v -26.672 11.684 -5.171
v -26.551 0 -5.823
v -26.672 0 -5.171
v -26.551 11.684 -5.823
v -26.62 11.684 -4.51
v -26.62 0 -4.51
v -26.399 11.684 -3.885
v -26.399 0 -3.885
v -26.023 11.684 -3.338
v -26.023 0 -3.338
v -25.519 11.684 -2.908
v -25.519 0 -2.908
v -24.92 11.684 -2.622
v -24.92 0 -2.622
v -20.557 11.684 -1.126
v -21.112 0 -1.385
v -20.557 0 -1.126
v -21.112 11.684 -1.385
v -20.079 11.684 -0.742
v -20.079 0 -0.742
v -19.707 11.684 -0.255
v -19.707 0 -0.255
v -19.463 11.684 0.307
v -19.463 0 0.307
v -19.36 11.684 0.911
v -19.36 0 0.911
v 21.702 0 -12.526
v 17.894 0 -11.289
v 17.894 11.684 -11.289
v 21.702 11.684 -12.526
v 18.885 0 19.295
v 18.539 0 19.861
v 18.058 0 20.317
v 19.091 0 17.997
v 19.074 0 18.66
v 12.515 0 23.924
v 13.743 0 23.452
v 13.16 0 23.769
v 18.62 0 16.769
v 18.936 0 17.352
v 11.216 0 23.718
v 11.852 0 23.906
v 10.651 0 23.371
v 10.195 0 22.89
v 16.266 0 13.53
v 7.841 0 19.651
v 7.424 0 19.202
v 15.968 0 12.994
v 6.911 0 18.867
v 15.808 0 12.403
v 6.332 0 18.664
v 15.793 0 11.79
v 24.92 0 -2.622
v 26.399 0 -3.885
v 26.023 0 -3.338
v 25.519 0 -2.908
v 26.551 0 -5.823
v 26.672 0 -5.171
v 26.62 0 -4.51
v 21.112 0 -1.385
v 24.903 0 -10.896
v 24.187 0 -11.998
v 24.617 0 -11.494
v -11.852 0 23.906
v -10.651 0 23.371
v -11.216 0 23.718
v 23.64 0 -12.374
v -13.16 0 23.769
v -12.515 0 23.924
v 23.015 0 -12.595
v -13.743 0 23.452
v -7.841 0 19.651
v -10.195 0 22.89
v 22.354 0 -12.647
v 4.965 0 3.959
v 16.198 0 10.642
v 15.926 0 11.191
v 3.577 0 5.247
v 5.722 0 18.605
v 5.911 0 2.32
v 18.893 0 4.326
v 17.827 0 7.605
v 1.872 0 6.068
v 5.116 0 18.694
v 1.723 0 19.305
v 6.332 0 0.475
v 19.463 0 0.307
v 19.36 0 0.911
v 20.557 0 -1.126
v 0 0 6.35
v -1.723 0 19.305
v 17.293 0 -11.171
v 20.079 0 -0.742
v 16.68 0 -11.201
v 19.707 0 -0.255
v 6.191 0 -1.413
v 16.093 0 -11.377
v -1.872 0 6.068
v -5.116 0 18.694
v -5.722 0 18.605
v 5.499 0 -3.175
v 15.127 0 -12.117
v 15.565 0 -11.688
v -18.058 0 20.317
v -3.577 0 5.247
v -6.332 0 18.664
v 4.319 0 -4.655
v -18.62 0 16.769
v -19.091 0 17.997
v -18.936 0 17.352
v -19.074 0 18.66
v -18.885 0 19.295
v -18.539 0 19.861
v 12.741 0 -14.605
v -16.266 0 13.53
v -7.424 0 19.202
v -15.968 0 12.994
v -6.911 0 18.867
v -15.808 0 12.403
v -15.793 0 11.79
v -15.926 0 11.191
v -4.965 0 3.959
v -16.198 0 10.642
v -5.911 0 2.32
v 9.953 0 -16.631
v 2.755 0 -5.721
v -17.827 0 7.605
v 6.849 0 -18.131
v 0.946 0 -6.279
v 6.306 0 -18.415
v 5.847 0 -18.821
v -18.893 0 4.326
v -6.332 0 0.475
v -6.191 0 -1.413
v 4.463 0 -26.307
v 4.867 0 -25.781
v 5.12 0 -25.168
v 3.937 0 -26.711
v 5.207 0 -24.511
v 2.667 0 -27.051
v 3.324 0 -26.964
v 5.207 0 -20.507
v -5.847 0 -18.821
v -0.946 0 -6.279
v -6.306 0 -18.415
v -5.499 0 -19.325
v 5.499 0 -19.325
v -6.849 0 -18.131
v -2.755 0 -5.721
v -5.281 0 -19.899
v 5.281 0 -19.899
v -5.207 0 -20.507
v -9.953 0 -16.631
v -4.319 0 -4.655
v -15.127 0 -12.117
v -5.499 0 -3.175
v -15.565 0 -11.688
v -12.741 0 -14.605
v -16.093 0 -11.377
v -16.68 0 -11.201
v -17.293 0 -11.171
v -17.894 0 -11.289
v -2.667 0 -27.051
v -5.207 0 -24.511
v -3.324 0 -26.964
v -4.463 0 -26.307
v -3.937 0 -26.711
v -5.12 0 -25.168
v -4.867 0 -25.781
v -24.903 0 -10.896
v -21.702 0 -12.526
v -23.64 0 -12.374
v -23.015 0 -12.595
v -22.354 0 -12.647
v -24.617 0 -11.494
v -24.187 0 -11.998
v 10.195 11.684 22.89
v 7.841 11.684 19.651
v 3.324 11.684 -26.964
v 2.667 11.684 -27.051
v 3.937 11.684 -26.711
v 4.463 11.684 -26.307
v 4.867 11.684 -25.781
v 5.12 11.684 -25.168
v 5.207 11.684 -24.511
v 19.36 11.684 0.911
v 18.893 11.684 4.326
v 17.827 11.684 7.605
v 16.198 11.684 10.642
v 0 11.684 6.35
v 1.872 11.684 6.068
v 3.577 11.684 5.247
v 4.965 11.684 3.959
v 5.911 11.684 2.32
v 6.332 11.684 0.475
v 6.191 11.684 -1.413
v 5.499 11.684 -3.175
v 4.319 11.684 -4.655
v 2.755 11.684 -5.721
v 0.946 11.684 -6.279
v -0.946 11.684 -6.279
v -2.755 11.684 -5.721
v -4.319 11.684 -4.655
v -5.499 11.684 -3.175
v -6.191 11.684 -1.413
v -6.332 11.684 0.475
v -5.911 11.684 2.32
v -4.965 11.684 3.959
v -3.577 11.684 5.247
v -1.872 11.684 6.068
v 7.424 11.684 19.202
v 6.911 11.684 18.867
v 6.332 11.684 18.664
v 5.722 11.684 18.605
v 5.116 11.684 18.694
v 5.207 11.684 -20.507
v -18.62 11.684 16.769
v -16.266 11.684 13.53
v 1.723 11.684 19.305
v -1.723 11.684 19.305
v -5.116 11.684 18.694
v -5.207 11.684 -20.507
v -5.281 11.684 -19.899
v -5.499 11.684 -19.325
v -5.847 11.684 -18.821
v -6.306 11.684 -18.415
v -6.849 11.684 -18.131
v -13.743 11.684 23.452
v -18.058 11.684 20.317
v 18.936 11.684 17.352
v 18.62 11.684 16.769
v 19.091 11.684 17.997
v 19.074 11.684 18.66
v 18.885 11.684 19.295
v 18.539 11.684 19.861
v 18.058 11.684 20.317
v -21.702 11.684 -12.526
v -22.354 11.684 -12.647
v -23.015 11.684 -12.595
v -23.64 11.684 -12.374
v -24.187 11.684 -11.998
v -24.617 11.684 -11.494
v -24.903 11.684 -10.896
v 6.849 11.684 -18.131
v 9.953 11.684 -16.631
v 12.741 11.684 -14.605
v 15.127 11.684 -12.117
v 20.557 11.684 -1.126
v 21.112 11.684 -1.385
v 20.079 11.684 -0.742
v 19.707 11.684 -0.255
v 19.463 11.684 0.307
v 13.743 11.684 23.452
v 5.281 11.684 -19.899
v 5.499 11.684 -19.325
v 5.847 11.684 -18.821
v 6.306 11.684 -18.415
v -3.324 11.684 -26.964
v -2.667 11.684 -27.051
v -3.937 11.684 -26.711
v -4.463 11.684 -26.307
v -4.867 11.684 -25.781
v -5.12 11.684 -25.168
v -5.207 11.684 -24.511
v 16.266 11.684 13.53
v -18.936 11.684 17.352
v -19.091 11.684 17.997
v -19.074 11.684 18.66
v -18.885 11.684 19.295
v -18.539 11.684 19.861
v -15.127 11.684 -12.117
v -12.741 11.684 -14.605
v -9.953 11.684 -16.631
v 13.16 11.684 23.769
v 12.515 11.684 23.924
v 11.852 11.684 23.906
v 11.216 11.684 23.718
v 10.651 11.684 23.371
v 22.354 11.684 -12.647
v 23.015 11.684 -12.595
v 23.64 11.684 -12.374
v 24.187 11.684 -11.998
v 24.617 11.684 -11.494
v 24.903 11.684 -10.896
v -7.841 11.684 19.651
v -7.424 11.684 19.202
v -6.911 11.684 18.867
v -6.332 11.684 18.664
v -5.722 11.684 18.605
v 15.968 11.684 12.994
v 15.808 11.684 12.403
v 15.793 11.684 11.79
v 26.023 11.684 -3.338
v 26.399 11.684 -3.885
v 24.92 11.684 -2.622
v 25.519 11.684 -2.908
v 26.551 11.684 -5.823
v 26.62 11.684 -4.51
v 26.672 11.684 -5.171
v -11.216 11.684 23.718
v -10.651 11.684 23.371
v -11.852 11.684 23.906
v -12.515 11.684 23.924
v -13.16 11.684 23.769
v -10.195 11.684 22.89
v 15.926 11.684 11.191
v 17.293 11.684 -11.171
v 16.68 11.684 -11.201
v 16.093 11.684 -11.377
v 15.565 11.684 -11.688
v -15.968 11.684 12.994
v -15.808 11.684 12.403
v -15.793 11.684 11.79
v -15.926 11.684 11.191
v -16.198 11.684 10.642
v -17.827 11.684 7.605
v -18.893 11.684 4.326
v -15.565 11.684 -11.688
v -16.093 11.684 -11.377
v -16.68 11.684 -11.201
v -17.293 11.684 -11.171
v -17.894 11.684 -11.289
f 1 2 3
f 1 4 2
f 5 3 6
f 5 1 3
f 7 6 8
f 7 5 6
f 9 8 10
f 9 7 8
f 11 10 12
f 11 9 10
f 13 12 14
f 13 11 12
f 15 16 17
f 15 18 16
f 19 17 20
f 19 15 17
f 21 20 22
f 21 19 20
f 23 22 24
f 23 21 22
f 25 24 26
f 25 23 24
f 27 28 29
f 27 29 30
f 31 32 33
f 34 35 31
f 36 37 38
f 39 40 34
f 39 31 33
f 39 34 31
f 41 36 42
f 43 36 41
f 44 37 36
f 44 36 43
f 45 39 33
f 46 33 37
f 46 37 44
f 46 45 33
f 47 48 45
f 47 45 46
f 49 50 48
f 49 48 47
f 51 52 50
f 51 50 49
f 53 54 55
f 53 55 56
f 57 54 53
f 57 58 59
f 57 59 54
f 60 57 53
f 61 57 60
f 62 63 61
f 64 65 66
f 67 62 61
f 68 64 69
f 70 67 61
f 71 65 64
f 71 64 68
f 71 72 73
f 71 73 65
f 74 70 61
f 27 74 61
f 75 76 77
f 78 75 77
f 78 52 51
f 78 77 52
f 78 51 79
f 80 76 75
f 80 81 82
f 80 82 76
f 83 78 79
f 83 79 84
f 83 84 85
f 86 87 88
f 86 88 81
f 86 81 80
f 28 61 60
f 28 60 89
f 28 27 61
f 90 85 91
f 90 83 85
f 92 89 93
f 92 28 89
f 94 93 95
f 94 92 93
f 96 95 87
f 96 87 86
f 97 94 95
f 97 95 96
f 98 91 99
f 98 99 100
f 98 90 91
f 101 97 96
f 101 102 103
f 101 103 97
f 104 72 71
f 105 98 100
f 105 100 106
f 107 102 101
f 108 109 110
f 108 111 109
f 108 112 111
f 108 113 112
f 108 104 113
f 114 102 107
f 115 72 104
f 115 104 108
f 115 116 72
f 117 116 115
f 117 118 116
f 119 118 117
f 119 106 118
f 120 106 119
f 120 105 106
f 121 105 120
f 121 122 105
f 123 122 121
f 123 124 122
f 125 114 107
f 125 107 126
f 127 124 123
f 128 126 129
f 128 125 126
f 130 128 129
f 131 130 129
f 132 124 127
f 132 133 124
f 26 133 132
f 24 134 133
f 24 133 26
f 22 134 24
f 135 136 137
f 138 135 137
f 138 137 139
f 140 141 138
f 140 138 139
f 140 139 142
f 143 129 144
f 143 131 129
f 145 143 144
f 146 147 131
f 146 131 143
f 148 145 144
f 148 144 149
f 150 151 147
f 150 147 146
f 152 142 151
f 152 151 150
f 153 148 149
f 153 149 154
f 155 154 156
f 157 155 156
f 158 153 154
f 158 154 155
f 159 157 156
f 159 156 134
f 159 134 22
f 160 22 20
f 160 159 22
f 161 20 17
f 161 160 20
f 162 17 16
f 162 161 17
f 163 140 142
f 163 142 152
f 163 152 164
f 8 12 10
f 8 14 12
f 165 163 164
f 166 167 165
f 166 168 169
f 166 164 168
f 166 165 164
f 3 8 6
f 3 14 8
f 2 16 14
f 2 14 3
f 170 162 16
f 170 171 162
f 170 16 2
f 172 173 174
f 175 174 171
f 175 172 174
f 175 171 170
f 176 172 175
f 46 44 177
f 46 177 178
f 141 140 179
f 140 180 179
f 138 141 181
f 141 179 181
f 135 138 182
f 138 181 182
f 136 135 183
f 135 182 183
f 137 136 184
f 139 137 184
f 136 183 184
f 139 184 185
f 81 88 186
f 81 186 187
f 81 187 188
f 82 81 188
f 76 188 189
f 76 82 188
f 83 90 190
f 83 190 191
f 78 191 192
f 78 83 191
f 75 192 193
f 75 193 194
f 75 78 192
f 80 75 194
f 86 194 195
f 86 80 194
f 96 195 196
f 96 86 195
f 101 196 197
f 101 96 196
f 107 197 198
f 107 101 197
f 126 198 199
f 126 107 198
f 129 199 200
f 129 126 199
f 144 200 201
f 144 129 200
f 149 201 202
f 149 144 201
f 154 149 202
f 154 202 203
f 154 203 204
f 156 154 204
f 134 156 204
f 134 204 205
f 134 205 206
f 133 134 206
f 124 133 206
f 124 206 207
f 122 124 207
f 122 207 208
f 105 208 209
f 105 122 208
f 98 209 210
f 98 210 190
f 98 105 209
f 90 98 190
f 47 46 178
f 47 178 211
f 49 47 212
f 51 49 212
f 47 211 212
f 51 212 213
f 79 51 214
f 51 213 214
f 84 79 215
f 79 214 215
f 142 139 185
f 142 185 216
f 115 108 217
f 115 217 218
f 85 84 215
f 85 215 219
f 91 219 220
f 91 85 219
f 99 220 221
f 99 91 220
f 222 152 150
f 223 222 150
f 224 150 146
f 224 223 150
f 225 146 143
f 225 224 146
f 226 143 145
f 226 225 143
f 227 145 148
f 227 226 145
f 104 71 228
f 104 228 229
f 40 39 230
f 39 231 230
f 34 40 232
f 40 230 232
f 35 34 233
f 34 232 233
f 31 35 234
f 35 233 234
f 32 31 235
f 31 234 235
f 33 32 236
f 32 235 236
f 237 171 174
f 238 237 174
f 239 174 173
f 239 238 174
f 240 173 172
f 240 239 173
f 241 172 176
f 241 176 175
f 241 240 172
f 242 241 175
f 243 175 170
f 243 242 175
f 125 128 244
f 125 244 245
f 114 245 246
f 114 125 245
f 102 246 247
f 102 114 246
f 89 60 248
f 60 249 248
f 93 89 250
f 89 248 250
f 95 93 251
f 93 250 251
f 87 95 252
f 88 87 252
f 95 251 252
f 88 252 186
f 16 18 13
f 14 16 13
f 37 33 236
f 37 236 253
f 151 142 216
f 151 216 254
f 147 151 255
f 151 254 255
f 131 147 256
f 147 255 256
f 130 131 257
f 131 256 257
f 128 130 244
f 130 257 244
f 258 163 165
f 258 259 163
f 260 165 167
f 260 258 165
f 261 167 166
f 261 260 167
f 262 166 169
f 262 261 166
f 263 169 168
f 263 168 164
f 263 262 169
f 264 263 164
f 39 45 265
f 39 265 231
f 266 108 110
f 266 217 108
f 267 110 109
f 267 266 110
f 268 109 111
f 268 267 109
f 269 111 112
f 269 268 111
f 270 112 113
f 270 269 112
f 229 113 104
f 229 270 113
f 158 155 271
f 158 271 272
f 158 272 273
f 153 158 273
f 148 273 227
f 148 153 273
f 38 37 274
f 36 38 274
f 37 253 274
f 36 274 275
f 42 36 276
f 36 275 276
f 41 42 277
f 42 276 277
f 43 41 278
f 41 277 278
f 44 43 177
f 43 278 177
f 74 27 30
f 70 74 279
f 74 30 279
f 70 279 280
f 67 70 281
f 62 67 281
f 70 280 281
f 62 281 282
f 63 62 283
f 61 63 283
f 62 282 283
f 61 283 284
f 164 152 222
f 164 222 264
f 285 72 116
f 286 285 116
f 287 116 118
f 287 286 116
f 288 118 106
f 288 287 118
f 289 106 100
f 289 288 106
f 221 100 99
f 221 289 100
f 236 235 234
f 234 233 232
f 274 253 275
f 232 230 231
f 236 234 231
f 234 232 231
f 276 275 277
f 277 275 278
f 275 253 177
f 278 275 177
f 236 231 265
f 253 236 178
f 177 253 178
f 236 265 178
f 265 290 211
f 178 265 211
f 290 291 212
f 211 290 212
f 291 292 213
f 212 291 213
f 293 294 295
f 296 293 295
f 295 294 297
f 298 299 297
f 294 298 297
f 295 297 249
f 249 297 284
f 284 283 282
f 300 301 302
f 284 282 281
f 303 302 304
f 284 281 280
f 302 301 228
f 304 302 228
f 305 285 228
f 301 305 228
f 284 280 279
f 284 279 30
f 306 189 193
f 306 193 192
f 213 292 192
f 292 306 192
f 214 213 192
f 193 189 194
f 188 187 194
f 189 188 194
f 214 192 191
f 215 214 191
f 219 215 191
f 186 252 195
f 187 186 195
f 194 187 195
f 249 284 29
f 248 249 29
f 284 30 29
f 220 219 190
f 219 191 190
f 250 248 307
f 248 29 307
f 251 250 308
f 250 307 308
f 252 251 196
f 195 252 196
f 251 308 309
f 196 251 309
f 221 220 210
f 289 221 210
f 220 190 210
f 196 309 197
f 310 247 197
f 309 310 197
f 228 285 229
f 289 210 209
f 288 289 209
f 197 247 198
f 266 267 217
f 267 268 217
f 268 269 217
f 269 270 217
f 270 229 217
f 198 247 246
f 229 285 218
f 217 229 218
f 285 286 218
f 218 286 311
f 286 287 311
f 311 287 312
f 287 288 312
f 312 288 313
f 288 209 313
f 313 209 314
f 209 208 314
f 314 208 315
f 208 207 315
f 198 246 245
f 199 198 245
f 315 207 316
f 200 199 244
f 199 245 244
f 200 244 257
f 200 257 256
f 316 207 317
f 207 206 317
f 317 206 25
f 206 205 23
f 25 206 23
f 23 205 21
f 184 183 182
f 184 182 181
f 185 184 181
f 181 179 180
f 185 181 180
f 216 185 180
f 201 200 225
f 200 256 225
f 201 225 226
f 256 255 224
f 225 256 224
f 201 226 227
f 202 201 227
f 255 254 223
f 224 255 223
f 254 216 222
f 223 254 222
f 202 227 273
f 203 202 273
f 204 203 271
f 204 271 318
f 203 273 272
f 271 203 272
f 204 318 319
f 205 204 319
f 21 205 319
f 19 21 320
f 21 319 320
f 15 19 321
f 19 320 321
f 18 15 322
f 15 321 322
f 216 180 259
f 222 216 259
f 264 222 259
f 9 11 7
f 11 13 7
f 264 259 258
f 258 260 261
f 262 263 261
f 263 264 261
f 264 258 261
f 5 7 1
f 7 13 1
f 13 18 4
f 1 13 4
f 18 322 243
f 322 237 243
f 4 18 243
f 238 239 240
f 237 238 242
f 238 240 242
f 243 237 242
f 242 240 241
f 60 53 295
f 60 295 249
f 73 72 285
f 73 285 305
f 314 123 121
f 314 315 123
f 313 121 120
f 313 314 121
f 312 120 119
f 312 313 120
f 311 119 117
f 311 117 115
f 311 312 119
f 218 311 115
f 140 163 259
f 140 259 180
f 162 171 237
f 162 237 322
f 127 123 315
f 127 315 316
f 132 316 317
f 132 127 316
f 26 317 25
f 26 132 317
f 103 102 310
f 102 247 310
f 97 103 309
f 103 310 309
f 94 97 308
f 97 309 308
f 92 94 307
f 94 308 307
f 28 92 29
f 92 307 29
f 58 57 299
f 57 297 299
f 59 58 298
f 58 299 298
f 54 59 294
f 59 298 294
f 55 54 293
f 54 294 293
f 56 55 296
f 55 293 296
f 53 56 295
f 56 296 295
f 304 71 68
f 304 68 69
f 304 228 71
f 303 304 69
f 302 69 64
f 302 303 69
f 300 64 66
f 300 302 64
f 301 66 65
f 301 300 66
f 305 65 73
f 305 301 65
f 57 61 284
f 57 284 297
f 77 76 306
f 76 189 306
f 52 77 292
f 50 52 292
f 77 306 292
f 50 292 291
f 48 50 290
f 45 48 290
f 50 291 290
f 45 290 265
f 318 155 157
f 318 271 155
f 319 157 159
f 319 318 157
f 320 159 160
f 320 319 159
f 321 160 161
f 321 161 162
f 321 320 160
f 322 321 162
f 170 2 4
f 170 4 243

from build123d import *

# Parameters (mm, degrees)
SKETCH2_R           = 6.35
BOSS_EXTRUDE3_DEPTH = 11.684
FILLET1_R           = 2.54


with BuildPart() as part:
    # Sketch2 → Boss-Extrude3 (new body)
    with BuildSketch(Plane(origin=(0, 0, 0), x_dir=(1, 0, 0), z_dir=(0, 1, 0))):
        with BuildLine():
            Line((-5.207, 27.051), (5.207, 27.051))
            Line((5.207, 27.051), (5.207, 18.669))
            ThreePointArc((5.207, 18.669), (11.392188189, 15.680001858), (16.146222613, 10.721189548))
            Line((16.146222613, 10.721189548), (24.117978333, 13.311369995))
            Line((24.117978333, 13.311369995), (27.336081312, 3.407067434))
            Line((27.336081312, 3.407067434), (19.364325592, 0.816886988))
            ThreePointArc((19.364325592, 0.816886988), (18.432947696, -5.989227766), (15.185914365, -12.042940459))
            Line((15.185914365, -12.042940459), (20.112730349, -18.824120906))
            Line((20.112730349, -18.824120906), (11.68762737, -24.945316524))
            Line((11.68762737, -24.945316524), (6.760811385, -18.164136077))
            ThreePointArc((6.760811385, -18.164136077), (0, -19.381548184), (-6.760811385, -18.164136077))
            Line((-6.760811385, -18.164136077), (-11.68762737, -24.945316524))
            Line((-11.68762737, -24.945316524), (-20.112730349, -18.824120906))
            Line((-20.112730349, -18.824120906), (-15.185914365, -12.042940459))
            ThreePointArc((-15.185914365, -12.042940459), (-18.432947696, -5.989227766), (-19.364325592, 0.816886988))
            Line((-19.364325592, 0.816886988), (-27.336081312, 3.407067434))
            Line((-27.336081312, 3.407067434), (-24.117978333, 13.311369995))
            Line((-24.117978333, 13.311369995), (-16.146222613, 10.721189548))
            ThreePointArc((-16.146222613, 10.721189548), (-11.392188189, 15.680001858), (-5.207, 18.669))
            Line((-5.207, 18.669), (-5.207, 27.051))
        make_face()
        with Locations(Location((0, 0, 0), (0, 0, 270))):
            Circle(SKETCH2_R, mode=Mode.SUBTRACT)
    extrude(amount=BOSS_EXTRUDE3_DEPTH)

    # Fillet1
    fillet1_edges = [part.edges().sort_by_distance(p)[0] for p in [
        (-5.207, 5.842, -27.051),
        (5.207, 5.842, -27.051),
        (5.207, 5.842, -18.669),
        (16.146222613, 5.842, -10.721189548),
        (24.117978333, 5.842, -13.311369995),
        (27.336081312, 5.842, -3.407067434),
        (19.364325592, 5.842, -0.816886988),
        (15.185914365, 5.842, 12.042940459),
        (20.112730349, 5.842, 18.824120906),
        (11.68762737, 5.842, 24.945316524),
        (6.760811385, 5.842, 18.164136077),
        (-6.760811385, 5.842, 18.164136077),
        (-11.68762737, 5.842, 24.945316524),
        (-20.112730349, 5.842, 18.824120906),
        (-15.185914365, 5.842, 12.042940459),
        (-19.364325592, 5.842, -0.816886988),
        (-27.336081312, 5.842, -3.407067434),
        (-24.117978333, 5.842, -13.311369995),
        (-16.146222613, 5.842, -10.721189548),
        (-5.207, 5.842, -18.669),
    ]]
    fillet(fillet1_edges, radius=FILLET1_R)


solid = part.part
